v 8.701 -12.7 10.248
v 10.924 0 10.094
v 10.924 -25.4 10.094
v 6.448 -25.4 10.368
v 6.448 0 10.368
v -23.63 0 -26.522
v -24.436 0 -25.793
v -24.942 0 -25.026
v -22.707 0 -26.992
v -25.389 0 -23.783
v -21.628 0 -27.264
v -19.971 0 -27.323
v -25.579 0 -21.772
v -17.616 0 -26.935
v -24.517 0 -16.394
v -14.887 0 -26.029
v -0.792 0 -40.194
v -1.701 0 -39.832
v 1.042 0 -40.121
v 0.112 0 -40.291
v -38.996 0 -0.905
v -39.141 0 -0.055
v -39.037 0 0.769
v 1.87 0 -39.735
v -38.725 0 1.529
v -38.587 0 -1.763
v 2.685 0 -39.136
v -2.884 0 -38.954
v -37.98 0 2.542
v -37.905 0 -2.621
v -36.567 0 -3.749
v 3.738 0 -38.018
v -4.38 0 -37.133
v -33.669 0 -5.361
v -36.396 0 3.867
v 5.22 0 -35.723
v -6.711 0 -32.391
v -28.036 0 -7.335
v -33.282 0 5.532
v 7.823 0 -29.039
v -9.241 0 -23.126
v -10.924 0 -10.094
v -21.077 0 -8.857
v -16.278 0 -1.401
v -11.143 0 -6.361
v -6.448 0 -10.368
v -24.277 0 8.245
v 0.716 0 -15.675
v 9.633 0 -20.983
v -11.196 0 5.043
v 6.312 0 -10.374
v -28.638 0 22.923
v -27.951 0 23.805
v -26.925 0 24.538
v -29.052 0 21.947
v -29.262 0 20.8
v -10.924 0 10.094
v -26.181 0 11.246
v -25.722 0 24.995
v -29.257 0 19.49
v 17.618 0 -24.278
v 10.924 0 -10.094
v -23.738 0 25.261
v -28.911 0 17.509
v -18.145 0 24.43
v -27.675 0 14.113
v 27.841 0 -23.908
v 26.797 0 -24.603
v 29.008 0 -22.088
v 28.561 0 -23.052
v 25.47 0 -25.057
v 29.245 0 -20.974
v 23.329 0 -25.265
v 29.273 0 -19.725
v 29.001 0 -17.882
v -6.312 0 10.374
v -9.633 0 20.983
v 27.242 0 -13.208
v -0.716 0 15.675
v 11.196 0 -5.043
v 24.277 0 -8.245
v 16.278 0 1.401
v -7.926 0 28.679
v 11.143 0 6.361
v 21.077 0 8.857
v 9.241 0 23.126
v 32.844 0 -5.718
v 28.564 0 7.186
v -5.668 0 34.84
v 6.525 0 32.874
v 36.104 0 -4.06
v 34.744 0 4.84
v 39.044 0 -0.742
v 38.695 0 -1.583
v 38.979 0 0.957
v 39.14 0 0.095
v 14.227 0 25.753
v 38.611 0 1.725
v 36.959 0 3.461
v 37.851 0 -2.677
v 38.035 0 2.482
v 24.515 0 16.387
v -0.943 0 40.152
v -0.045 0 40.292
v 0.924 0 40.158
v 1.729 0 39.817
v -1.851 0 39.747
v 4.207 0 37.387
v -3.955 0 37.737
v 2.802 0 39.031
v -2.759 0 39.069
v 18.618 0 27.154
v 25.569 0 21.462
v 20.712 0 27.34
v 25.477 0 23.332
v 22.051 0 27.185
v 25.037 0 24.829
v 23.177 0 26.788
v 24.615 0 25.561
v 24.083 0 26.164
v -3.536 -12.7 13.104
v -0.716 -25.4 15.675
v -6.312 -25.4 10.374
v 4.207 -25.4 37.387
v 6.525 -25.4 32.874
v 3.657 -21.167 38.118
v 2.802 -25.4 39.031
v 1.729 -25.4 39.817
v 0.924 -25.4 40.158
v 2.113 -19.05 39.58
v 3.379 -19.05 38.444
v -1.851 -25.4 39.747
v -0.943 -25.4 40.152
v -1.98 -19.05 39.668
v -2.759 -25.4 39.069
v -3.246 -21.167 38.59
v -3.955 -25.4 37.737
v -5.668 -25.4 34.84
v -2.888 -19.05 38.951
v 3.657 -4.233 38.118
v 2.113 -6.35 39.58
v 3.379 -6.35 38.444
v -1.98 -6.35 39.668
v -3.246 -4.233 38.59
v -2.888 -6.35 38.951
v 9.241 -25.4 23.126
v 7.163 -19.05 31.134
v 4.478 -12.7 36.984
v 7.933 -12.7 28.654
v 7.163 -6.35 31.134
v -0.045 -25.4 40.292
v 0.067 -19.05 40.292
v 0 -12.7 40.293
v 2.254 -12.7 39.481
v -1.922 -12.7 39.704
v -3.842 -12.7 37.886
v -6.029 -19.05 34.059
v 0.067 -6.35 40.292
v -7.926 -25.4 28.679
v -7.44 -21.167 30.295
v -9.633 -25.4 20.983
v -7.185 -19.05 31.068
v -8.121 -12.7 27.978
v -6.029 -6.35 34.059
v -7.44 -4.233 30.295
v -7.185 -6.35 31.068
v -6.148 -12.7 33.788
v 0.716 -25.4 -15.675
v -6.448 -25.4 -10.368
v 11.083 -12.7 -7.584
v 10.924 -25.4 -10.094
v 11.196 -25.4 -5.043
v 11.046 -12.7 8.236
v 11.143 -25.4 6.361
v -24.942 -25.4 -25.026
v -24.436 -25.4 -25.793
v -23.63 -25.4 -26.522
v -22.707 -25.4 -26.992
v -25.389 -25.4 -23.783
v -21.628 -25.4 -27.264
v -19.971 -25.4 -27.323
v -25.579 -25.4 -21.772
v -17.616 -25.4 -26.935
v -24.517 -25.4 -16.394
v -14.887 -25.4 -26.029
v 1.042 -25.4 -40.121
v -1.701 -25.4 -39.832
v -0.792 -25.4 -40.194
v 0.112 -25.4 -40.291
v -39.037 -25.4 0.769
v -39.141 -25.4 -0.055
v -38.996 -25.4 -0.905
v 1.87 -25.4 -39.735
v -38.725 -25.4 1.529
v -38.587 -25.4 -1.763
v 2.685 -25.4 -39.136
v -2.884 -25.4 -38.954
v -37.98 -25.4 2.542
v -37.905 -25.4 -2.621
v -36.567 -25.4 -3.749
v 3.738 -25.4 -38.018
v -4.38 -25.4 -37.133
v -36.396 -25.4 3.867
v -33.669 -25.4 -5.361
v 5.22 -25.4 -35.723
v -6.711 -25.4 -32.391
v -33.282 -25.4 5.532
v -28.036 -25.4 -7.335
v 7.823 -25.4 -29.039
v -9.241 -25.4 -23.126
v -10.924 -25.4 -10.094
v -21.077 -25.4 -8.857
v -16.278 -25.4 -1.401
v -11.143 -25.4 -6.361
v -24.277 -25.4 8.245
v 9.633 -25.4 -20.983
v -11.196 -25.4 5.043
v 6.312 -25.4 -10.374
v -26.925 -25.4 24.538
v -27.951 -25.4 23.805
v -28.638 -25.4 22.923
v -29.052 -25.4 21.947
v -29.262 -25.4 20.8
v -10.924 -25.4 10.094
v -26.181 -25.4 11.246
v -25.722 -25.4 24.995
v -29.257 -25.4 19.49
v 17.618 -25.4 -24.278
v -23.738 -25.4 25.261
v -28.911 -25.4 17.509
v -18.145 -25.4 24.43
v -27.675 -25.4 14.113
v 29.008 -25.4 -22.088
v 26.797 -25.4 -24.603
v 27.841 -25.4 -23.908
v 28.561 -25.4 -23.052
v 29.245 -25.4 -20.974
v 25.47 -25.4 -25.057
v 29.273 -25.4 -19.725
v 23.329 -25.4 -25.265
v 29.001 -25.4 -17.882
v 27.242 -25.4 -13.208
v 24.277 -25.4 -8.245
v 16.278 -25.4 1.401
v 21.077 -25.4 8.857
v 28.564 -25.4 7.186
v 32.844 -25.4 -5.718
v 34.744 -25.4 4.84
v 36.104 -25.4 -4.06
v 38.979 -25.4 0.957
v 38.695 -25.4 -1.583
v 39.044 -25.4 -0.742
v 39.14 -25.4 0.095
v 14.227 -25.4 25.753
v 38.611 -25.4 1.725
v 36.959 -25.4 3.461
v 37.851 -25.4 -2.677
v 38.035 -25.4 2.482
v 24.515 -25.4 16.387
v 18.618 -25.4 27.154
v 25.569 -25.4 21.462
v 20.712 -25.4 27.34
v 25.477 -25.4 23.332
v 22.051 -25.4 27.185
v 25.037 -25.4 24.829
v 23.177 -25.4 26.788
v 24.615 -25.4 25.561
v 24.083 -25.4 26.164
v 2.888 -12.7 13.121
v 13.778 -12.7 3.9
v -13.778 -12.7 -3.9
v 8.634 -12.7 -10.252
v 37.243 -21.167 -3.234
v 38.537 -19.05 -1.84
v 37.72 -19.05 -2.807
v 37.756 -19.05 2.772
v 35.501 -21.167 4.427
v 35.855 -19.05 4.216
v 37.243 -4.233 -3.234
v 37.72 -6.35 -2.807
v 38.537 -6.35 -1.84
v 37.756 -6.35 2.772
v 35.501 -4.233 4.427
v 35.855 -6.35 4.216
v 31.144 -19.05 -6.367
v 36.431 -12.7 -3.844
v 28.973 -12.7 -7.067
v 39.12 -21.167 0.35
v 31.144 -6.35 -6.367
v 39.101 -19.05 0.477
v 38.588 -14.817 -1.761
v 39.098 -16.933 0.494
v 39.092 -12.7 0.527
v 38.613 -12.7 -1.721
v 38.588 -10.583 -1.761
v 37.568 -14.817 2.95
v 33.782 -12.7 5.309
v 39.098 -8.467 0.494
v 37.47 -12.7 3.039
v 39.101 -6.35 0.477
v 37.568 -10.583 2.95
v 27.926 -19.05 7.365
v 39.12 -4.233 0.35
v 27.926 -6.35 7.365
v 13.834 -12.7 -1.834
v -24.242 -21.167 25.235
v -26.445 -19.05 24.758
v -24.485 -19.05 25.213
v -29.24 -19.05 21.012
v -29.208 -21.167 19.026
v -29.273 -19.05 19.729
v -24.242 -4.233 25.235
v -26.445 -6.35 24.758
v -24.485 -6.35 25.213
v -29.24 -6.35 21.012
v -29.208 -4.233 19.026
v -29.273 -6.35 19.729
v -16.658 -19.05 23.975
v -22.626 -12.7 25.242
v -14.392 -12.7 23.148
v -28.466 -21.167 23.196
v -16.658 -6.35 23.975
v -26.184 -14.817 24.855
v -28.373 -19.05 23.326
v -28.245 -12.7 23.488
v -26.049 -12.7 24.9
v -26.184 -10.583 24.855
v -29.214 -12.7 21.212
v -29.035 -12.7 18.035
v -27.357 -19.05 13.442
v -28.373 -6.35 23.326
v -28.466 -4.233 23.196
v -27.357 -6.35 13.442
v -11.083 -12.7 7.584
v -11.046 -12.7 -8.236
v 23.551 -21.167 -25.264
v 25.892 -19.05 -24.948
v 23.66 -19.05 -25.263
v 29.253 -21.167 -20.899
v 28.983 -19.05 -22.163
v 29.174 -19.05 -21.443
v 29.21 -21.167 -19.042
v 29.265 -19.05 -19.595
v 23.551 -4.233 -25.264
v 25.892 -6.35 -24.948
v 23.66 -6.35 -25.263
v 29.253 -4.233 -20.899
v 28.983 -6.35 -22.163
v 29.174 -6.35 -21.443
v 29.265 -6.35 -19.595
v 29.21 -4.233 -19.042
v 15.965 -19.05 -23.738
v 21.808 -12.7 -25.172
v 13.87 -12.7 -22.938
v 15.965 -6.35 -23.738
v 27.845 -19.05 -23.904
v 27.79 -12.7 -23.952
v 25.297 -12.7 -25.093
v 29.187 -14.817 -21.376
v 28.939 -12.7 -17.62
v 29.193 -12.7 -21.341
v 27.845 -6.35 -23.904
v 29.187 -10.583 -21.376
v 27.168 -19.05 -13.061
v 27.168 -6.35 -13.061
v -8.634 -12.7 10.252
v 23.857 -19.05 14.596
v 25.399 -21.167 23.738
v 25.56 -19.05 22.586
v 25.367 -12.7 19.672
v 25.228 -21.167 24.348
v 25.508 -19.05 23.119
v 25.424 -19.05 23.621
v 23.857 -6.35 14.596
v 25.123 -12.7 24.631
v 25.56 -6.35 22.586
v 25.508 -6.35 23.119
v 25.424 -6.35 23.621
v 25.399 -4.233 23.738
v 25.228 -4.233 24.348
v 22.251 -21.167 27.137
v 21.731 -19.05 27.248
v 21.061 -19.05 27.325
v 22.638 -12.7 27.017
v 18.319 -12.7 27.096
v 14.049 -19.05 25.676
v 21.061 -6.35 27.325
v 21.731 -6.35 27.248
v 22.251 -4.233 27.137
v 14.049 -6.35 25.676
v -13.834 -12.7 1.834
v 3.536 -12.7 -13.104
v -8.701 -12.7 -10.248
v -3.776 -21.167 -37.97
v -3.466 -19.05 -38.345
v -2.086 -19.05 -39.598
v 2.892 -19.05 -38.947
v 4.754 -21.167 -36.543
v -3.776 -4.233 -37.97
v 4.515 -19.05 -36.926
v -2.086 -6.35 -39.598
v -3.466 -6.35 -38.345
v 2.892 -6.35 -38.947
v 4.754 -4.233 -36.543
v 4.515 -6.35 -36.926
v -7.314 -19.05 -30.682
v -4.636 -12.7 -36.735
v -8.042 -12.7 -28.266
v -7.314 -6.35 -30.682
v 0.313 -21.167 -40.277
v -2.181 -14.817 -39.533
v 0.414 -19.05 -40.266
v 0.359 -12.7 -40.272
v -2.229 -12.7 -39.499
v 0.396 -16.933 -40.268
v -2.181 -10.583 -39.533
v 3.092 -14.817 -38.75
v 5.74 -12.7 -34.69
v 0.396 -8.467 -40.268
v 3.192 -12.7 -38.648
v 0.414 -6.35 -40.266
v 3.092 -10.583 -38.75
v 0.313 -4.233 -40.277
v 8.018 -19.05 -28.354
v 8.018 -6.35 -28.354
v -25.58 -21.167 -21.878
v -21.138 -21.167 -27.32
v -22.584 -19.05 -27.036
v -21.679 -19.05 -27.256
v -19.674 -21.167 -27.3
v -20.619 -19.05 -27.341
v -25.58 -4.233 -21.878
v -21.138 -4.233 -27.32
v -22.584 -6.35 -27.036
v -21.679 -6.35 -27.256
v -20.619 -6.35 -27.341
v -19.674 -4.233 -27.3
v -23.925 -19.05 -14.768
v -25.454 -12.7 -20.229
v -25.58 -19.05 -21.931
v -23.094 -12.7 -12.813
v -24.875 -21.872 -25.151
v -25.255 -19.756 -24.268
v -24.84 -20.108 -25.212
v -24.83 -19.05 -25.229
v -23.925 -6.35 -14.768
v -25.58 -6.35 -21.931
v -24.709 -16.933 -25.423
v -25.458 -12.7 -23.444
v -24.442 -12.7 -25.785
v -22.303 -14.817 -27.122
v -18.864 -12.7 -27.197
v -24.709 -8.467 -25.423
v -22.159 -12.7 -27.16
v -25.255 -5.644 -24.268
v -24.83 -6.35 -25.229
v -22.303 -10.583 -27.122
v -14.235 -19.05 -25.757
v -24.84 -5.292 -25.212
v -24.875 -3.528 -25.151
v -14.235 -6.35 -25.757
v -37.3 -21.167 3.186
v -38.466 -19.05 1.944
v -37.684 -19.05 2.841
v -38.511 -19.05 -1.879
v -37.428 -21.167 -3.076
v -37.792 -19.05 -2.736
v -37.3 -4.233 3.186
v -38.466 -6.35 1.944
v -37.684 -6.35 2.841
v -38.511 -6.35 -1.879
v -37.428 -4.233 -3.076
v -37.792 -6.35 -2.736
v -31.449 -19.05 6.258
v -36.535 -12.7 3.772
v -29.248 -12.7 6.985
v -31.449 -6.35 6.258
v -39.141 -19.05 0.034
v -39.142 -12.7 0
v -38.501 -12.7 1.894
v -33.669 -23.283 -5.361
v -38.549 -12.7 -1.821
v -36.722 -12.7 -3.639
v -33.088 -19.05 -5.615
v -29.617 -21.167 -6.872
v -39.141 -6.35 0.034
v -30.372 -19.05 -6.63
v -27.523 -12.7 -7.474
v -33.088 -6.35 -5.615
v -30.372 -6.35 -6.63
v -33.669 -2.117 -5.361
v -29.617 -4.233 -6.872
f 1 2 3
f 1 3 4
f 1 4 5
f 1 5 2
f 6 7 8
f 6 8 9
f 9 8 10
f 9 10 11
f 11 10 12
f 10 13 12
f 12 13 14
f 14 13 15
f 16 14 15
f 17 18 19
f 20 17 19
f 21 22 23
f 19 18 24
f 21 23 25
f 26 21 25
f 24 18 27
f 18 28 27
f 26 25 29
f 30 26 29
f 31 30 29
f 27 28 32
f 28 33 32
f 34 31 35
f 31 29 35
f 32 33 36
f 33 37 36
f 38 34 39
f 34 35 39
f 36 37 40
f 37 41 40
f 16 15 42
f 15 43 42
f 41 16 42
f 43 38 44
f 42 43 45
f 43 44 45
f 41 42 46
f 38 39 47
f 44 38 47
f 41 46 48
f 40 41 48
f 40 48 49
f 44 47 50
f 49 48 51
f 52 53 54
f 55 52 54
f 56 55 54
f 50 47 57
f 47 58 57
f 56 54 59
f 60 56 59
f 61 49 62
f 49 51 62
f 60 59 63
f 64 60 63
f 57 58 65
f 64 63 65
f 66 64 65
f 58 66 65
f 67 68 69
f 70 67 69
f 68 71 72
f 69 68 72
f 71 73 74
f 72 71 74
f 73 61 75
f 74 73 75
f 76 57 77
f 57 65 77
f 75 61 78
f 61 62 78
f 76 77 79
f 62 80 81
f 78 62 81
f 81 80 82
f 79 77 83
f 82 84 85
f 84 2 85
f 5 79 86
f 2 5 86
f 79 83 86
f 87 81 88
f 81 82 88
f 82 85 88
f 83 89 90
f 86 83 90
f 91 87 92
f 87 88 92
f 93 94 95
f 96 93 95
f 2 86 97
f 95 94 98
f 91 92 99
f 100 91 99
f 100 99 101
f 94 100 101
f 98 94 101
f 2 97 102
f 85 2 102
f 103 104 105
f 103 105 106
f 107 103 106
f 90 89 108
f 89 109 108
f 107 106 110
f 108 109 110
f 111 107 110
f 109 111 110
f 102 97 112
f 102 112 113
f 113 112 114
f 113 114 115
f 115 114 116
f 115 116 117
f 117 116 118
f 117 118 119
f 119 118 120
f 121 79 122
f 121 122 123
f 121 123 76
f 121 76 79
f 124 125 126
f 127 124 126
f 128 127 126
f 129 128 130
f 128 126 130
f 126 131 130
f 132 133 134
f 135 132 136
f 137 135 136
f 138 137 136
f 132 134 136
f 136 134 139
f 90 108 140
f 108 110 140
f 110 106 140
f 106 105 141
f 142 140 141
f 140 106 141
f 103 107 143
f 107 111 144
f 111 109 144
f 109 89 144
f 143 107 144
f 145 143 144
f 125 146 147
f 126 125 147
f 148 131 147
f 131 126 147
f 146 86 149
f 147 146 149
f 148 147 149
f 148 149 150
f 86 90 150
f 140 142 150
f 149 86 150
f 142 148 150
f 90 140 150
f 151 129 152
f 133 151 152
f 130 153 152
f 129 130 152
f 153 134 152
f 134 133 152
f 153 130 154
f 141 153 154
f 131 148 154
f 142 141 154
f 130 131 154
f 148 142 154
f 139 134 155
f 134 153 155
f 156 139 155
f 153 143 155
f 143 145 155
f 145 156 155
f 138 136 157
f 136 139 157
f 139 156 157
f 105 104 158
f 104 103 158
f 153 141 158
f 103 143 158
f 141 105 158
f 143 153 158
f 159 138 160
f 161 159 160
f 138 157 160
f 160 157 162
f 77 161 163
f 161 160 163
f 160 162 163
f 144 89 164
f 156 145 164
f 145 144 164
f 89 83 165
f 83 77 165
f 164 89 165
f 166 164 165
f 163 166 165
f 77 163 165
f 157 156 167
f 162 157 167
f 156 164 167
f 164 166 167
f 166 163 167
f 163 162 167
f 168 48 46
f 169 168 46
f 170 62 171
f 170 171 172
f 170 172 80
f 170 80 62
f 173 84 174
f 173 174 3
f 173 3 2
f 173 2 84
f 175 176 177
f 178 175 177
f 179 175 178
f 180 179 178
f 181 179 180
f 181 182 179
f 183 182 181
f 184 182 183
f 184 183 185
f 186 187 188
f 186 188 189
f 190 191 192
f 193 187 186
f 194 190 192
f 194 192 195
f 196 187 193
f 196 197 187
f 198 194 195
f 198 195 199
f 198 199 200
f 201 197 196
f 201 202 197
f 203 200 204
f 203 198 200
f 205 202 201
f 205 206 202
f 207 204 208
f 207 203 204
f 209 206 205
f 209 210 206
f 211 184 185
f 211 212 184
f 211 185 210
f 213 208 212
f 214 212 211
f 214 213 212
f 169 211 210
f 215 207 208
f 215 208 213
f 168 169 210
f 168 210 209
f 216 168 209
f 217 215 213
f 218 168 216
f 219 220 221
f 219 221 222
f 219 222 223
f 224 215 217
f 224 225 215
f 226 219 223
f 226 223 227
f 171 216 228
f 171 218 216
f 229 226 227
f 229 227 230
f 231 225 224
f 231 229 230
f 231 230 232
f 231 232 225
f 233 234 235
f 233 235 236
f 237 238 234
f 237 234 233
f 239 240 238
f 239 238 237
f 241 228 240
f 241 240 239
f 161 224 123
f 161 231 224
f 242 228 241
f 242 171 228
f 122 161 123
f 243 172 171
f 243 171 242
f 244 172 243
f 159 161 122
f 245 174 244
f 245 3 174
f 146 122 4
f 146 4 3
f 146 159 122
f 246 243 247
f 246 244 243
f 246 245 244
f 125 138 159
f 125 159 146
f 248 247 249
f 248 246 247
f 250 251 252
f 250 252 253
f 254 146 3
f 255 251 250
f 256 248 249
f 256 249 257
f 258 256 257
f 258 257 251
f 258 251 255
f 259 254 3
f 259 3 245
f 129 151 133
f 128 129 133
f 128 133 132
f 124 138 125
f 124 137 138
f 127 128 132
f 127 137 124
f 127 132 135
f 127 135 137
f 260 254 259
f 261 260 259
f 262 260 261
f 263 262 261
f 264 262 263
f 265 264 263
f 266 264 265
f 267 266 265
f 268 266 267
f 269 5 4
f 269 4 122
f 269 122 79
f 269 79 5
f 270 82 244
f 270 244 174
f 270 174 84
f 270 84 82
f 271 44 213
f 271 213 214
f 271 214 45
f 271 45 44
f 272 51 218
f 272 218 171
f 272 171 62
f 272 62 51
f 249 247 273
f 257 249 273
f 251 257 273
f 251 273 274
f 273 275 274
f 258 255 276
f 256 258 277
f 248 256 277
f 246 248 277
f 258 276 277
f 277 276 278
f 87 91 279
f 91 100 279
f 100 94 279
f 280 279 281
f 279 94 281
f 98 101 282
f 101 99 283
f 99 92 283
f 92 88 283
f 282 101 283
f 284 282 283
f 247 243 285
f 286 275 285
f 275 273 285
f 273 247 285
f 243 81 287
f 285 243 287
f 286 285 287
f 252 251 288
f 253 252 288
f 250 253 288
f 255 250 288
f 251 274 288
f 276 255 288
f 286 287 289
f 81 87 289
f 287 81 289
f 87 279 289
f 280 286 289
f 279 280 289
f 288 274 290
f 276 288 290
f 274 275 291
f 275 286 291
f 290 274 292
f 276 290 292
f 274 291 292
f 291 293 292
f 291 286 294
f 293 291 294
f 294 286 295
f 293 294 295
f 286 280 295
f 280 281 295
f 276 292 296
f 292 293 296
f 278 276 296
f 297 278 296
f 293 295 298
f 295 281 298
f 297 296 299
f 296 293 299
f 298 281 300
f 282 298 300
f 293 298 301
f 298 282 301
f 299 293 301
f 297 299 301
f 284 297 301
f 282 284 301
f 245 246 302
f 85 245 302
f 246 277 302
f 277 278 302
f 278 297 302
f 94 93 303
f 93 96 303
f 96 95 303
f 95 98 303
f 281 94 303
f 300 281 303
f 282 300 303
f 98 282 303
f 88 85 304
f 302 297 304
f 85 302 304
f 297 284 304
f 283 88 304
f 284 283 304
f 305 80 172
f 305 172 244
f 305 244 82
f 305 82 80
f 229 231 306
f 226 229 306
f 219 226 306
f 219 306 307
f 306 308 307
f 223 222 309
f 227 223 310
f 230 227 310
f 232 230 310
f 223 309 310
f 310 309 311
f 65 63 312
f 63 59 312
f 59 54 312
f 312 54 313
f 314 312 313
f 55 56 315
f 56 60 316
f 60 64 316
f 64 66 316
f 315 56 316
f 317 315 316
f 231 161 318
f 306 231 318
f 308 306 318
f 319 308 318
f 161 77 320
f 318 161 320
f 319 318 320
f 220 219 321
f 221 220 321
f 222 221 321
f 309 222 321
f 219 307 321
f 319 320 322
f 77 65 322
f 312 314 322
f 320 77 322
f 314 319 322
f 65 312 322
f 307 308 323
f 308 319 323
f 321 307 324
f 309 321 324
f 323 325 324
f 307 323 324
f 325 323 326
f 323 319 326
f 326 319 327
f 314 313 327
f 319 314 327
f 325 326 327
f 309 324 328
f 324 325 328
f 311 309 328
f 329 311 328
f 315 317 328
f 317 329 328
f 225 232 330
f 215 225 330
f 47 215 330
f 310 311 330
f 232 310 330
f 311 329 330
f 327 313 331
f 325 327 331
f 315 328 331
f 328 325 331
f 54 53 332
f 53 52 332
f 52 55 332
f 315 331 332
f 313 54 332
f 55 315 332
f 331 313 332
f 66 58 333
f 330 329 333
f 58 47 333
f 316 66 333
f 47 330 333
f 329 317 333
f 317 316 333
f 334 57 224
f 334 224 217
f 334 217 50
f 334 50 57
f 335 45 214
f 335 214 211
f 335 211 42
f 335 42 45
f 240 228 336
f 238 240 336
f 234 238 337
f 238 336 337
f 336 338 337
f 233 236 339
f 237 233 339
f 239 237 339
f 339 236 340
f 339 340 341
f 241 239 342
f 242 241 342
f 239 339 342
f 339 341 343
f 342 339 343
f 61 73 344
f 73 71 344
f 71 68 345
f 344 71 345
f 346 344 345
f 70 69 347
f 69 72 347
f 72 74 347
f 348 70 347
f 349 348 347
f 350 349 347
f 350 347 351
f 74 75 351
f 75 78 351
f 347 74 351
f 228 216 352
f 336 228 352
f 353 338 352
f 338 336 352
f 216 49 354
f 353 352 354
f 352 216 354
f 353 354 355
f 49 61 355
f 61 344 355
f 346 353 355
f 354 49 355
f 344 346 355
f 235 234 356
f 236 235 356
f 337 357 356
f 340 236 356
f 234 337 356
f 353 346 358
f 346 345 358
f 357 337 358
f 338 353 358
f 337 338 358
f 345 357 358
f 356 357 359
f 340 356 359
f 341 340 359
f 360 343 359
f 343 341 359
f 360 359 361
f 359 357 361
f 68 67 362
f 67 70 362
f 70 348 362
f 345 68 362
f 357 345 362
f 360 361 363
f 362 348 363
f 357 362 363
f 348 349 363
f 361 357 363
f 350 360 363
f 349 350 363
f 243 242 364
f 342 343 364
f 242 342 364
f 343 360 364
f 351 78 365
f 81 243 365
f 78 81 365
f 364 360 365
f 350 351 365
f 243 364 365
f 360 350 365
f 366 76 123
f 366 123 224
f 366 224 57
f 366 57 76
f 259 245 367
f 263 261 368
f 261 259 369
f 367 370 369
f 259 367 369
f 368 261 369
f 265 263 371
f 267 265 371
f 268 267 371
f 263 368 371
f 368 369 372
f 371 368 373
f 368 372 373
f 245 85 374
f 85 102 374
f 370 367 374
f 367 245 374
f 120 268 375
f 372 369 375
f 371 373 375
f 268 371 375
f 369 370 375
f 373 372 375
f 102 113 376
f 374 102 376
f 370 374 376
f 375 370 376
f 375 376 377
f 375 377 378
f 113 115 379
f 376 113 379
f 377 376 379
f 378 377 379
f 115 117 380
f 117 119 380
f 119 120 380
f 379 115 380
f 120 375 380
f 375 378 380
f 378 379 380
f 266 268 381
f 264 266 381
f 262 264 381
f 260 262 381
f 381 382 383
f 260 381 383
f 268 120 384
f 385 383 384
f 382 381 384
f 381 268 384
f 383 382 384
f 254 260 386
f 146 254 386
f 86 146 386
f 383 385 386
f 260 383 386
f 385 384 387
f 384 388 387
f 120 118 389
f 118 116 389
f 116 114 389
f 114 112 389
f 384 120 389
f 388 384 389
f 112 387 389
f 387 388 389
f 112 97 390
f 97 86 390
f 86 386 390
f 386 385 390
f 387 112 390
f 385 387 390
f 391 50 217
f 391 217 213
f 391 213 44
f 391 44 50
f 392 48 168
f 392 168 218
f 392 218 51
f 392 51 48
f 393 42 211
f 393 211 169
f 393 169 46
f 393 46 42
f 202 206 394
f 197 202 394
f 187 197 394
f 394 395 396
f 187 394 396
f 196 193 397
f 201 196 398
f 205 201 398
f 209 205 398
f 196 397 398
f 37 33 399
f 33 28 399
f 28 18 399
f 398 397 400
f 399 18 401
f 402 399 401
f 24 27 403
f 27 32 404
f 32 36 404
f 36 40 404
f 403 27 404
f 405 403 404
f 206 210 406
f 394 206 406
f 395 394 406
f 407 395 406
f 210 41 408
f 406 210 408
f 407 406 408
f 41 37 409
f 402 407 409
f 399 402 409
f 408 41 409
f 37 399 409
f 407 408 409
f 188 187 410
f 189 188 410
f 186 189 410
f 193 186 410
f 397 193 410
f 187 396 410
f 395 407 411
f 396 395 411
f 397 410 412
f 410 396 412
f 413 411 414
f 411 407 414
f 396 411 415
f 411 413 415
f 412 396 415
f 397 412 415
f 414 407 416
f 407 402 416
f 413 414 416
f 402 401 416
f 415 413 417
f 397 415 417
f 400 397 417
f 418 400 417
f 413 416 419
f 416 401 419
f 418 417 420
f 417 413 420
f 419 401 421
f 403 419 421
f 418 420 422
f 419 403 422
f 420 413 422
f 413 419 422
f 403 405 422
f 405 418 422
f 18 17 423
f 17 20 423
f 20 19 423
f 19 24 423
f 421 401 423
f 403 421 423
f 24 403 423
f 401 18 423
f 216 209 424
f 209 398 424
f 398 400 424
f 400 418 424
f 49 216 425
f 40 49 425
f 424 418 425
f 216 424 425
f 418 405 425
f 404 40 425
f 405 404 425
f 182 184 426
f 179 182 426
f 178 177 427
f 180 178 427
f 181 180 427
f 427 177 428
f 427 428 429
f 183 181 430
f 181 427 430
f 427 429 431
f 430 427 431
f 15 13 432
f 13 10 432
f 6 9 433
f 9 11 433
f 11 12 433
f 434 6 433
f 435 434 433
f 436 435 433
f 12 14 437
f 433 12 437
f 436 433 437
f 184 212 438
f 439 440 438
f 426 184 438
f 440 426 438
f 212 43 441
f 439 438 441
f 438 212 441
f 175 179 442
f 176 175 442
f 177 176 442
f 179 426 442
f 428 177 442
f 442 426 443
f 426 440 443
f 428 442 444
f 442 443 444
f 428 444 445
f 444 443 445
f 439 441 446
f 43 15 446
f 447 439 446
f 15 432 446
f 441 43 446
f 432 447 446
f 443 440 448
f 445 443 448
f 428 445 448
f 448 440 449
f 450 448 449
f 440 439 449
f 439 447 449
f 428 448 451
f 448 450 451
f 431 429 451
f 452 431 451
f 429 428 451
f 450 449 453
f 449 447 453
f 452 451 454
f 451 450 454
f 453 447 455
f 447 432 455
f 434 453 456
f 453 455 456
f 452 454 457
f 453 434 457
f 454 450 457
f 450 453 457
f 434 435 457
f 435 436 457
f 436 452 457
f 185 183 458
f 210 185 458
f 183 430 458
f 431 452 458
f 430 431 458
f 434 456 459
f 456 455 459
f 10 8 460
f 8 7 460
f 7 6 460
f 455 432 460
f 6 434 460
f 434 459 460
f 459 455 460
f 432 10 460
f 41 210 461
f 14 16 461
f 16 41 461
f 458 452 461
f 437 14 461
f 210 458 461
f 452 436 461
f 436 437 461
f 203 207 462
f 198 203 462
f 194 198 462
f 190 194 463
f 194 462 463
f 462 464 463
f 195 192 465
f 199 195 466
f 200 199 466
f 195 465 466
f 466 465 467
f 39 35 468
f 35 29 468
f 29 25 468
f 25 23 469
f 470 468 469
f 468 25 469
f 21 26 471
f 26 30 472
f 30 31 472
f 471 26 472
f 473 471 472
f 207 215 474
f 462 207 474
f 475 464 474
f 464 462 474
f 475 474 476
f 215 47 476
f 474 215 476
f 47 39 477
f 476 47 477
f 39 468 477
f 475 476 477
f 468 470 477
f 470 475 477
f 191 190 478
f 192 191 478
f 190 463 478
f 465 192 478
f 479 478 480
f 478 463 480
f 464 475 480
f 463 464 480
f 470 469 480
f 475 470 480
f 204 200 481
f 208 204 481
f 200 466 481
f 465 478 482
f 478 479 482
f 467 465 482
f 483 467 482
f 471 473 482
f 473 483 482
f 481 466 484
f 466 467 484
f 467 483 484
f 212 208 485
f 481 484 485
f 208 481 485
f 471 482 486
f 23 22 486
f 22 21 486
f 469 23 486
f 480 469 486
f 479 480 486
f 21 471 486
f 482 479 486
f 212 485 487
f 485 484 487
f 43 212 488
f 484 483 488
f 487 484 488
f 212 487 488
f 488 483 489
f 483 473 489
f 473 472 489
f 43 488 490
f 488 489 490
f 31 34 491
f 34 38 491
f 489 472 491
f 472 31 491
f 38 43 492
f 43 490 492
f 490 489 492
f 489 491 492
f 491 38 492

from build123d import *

# Parameters (mm, degrees)
F1_DEPTH = 25.4


with BuildPart() as f1:
    # F0 (on Front) → F1 (new body)
    with BuildSketch(Plane.XZ):
        with BuildLine():
            add(Edge.make_bspline(
                [(-9.6334397965, 20.9826078179), (-24.1749871063, 28.3822451496), (-28.2449897272, 23.4879380359)],
                knots=[5.3150586543, 5.3150586543, 5.3150586543, 6.2831853072, 6.2831853072, 6.2831853072], degree=2, weights=[1, 0.885111246, 1]))
            add(Edge.make_bspline(
                [(-28.2449897272, 23.4879380359), (-31.7999684313, 19.2129635012), (-24.2773097088, 8.2450815815)],
                knots=[0, 0, 0, 0.8610435374, 0.8610435374, 0.8610435374], degree=2, weights=[1, 0.9087481158, 1]))
            add(Edge.make_bspline(
                [(-10.9244512844, 10.093500542), (-18.2738244712, 9.5198655215), (-24.2773097088, 8.2450815815)],
                knots=[4.9952466524, 4.9952466524, 4.9952466524, 5.3814419574, 5.3814419574, 5.3814419574], degree=2, weights=[1, 0.9814145055, 1]))
            add(Edge.make_bspline(
                [(-9.6334397965, 20.9826078179), (-10.5051315613, 15.8799657732), (-10.9244512844, 10.093500542)],
                knots=[1.0230633531, 1.0230633531, 1.0230633531, 1.3175957323, 1.3175957323, 1.3175957323], degree=2, weights=[1, 0.989175918, 1]))
        make_face()
        with BuildLine():
            add(Edge.make_bspline(
                [(-10.9244512844, 10.093500542), (-18.2738244712, 9.5198655215), (-24.2773097088, 8.2450815815)],
                knots=[4.9952466524, 4.9952466524, 4.9952466524, 5.3814419574, 5.3814419574, 5.3814419574], degree=2, weights=[1, 0.9814145055, 1]))
            add(Edge.make_bspline(
                [(-24.2773097088, 8.2450815815), (-21.0599122764, 3.554182203), (-16.2778676613, -1.4007753111)],
                knots=[0.8610435374, 0.8610435374, 0.8610435374, 1.2489447615, 1.2489447615, 1.2489447615], degree=2, weights=[1, 0.9812504656, 1]))
            add(Edge.make_bspline(
                [(-11.1955196289, 5.0427610987), (-13.9309966677, 1.8467505057), (-16.2778676613, -1.4007753111)],
                knots=[1.679891763, 1.679891763, 1.679891763, 1.9166436443, 1.9166436443, 1.9166436443], degree=2, weights=[1, 0.9930017462, 1]))
            add(Edge.make_bspline(
                [(-10.9244512844, 10.093500542), (-11.1052111409, 7.5990778678), (-11.1955196289, 5.0427610987)],
                knots=[1.3175957323, 1.3175957323, 1.3175957323, 1.4453143988, 1.4453143988, 1.4453143988], degree=2, weights=[1, 0.9979616856, 1]))
        make_face()
        with BuildLine():
            add(Edge.make_bspline(
                [(-24.2773097088, 8.2450815815), (-21.0599122764, 3.554182203), (-16.2778676613, -1.4007753111)],
                knots=[0.8610435374, 0.8610435374, 0.8610435374, 1.2489447615, 1.2489447615, 1.2489447615], degree=2, weights=[1, 0.9812504656, 1]))
            add(Edge.make_bspline(
                [(-24.2773097088, 8.2450815815), (-39.1415841877, 5.0887919203), (-39.1415841877, 0)],
                knots=[5.3814419574, 5.3814419574, 5.3814419574, 6.2831853072, 6.2831853072, 6.2831853072], degree=2, weights=[1, 0.9000676118, 1]))
            add(Edge.make_bspline(
                [(-39.1415841877, 0), (-39.1415841877, -5.7569625435), (-21.0774784797, -8.857047955)],
                knots=[0, 0, 0, 1.0021484051, 1.0021484051, 1.0021484051], degree=2, weights=[1, 0.8770670555, 1]))
            add(Edge.make_bspline(
                [(-16.2778676613, -1.4007753111), (-19.0449410134, -5.2297638547), (-21.0774784797, -8.857047955)],
                knots=[1.9166436443, 1.9166436443, 1.9166436443, 2.1952798257, 2.1952798257, 2.1952798257], degree=2, weights=[1, 0.9903109217, 1]))
        make_face()
        with BuildLine():
            add(Edge.make_bspline(
                [(0, 40.2928069234), (-6.3346503874, 40.2928069234), (-9.6334397965, 20.9826078179)],
                knots=[0, 0, 0, 1.0230633531, 1.0230633531, 1.0230633531], degree=2, weights=[1, 0.8719957546, 1]))
            add(Edge.make_bspline(
                [(-0.7156895988, 15.6745771205), (-5.3015148464, 18.7782568712), (-9.6334397965, 20.9826078179)],
                knots=[5.0043199829, 5.0043199829, 5.0043199829, 5.3150586543, 5.3150586543, 5.3150586543], degree=2, weights=[1, 0.9879544453, 1]))
            add(Edge.make_bspline(
                [(9.2405859063, 23.1259098387), (4.4354249084, 20.1875354382), (-0.7156895988, 15.6745771205)],
                knots=[0.8573022563, 0.8573022563, 0.8573022563, 1.2548784247, 1.2548784247, 1.2548784247], degree=2, weights=[1, 0.9803066286, 1]))
            add(Edge.make_bspline(
                [(9.2405859063, 23.1259098387), (5.8709662193, 40.2928069234), (0, 40.2928069234)],
                knots=[5.3237058825, 5.3237058825, 5.3237058825, 6.2831853072, 6.2831853072, 6.2831853072], degree=2, weights=[1, 0.8871150882, 1]))
        make_face()
        with BuildLine():
            add(Edge.make_bspline(
                [(-0.7156895988, 15.6745771205), (-5.3015148464, 18.7782568712), (-9.6334397965, 20.9826078179)],
                knots=[5.0043199829, 5.0043199829, 5.0043199829, 5.3150586543, 5.3150586543, 5.3150586543], degree=2, weights=[1, 0.9879544453, 1]))
            add(Edge.make_bspline(
                [(-9.6334397965, 20.9826078179), (-10.5051315613, 15.8799657732), (-10.9244512844, 10.093500542)],
                knots=[1.0230633531, 1.0230633531, 1.0230633531, 1.3175957323, 1.3175957323, 1.3175957323], degree=2, weights=[1, 0.989175918, 1]))
            add(Edge.make_bspline(
                [(-6.3122484149, 10.3736136544), (-8.649911175, 10.2710334865), (-10.9244512844, 10.093500542)],
                knots=[4.8743633692, 4.8743633692, 4.8743633692, 4.9952466524, 4.9952466524, 4.9952466524], degree=2, weights=[1, 0.99817396, 1]))
            add(Edge.make_bspline(
                [(-0.7156895988, 15.6745771205), (-3.5573674178, 13.184946278), (-6.3122484149, 10.3736136544)],
                knots=[1.2548784247, 1.2548784247, 1.2548784247, 1.476233539, 1.476233539, 1.476233539], degree=2, weights=[1, 0.9938814887, 1]))
        make_face()
        with BuildLine():
            add(Edge.make_bspline(
                [(-16.2778676613, -1.4007753111), (-13.8469877195, -3.9195529059), (-11.1427402225, -6.3609505957)],
                knots=[1.2489447615, 1.2489447615, 1.2489447615, 1.4479790573, 1.4479790573, 1.4479790573], degree=2, weights=[1, 0.9950522541, 1]))
            add(Edge.make_bspline(
                [(-16.2778676613, -1.4007753111), (-19.0449410134, -5.2297638547), (-21.0774784797, -8.857047955)],
                knots=[1.9166436443, 1.9166436443, 1.9166436443, 2.1952798257, 2.1952798257, 2.1952798257], degree=2, weights=[1, 0.9903109217, 1]))
            add(Edge.make_bspline(
                [(-21.0774784797, -8.857047955), (-16.3321884544, -9.6714145568), (-10.9244512844, -10.093500542)],
                knots=[1.0021484051, 1.0021484051, 1.0021484051, 1.2879386547, 1.2879386547, 1.2879386547], degree=2, weights=[1, 0.9898078522, 1]))
            add(Edge.make_bspline(
                [(-11.1427402225, -6.3609505957), (-11.0583542324, -8.2456867845), (-10.9244512844, -10.093500542)],
                knots=[1.7293276756, 1.7293276756, 1.7293276756, 1.8239969212, 1.8239969212, 1.8239969212], degree=2, weights=[1, 0.9988799259, 1]))
        make_face()
        with BuildLine():
            add(Edge.make_bspline(
                [(9.2405859063, 23.1259098387), (4.4354249084, 20.1875354382), (-0.7156895988, 15.6745771205)],
                knots=[0.8573022563, 0.8573022563, 0.8573022563, 1.2548784247, 1.2548784247, 1.2548784247], degree=2, weights=[1, 0.9803066286, 1]))
            add(Edge.make_bspline(
                [(6.4476243744, 10.3676077129), (2.9099172017, 13.2207717958), (-0.7156895988, 15.6745771205)],
                knots=[4.7579047623, 4.7579047623, 4.7579047623, 5.0043199829, 5.0043199829, 5.0043199829], degree=2, weights=[1, 0.992419539, 1]))
            add(Edge.make_bspline(
                [(10.9244512844, 10.093500542), (8.716024728, 10.2658731758), (6.4476243744, 10.3676077129)],
                knots=[4.4295313083, 4.4295313083, 4.4295313083, 4.546909087, 4.546909087, 4.546909087], degree=2, weights=[1, 0.9982783014, 1]))
            add(Edge.make_bspline(
                [(10.9244512844, 10.093500542), (10.4128198041, 17.1538356722), (9.2405859063, 23.1259098387)],
                knots=[4.9655895748, 4.9655895748, 4.9655895748, 5.3237058825, 5.3237058825, 5.3237058825], degree=2, weights=[1, 0.9840118747, 1]))
        make_face()
        with BuildLine():
            add(Edge.make_bspline(
                [(-21.0774784797, -8.857047955), (-16.3321884544, -9.6714145568), (-10.9244512844, -10.093500542)],
                knots=[1.0021484051, 1.0021484051, 1.0021484051, 1.2879386547, 1.2879386547, 1.2879386547], degree=2, weights=[1, 0.9898078522, 1]))
            add(Edge.make_bspline(
                [(-21.0774784797, -8.857047955), (-39.4110199858, -41.5752461227), (-9.2405859063, -23.1259098387)],
                knots=[2.1952798257, 2.1952798257, 2.1952798257, 3.9988949099, 3.9988949099, 3.9988949099], degree=2, weights=[1, 0.6201930572, 1]))
            add(Edge.make_bspline(
                [(-10.9244512844, -10.093500542), (-10.4128198041, -17.1538356722), (-9.2405859063, -23.1259098387)],
                knots=[1.8239969212, 1.8239969212, 1.8239969212, 2.1821132289, 2.1821132289, 2.1821132289], degree=2, weights=[1, 0.9840118747, 1]))
        make_face()
        with BuildLine():
            add(Edge.make_bspline(
                [(24.0825692568, 26.1637814162), (20.1411706974, 29.791659293), (9.2405859063, 23.1259098387)],
                knots=[0, 0, 0, 0.8573022563, 0.8573022563, 0.8573022563], degree=2, weights=[1, 0.9095272279, 1]))
            add(Edge.make_bspline(
                [(10.9244512844, 10.093500542), (10.4128198041, 17.1538356722), (9.2405859063, 23.1259098387)],
                knots=[4.9655895748, 4.9655895748, 4.9655895748, 5.3237058825, 5.3237058825, 5.3237058825], degree=2, weights=[1, 0.9840118747, 1]))
            add(Edge.make_bspline(
                [(21.0774784797, 8.857047955), (16.3321884544, 9.6714145568), (10.9244512844, 10.093500542)],
                knots=[4.1437410587, 4.1437410587, 4.1437410587, 4.4295313083, 4.4295313083, 4.4295313083], degree=2, weights=[1, 0.9898078522, 1]))
            add(Edge.make_bspline(
                [(21.0774784797, 8.857047955), (28.4979272045, 22.0996455071), (24.0825692568, 26.1637814162)],
                knots=[5.3368724793, 5.3368724793, 5.3368724793, 6.2831853072, 6.2831853072, 6.2831853072], degree=2, weights=[1, 0.8901343527, 1]))
        make_face()
        with BuildLine():
            add(Edge.make_bspline(
                [(-6.4476243744, -10.3676077129), (-2.9099172017, -13.2207717958), (0.7156895988, -15.6745771205)],
                knots=[1.6163121087, 1.6163121087, 1.6163121087, 1.8627273293, 1.8627273293, 1.8627273293], degree=2, weights=[1, 0.992419539, 1]))
            add(Edge.make_bspline(
                [(-10.9244512844, -10.093500542), (-8.716024728, -10.2658731758), (-6.4476243744, -10.3676077129)],
                knots=[1.2879386547, 1.2879386547, 1.2879386547, 1.4053164334, 1.4053164334, 1.4053164334], degree=2, weights=[1, 0.9982783014, 1]))
            add(Edge.make_bspline(
                [(-10.9244512844, -10.093500542), (-10.4128198041, -17.1538356722), (-9.2405859063, -23.1259098387)],
                knots=[1.8239969212, 1.8239969212, 1.8239969212, 2.1821132289, 2.1821132289, 2.1821132289], degree=2, weights=[1, 0.9840118747, 1]))
            add(Edge.make_bspline(
                [(-9.2405859063, -23.1259098387), (-4.4354249084, -20.1875354382), (0.7156895988, -15.6745771205)],
                knots=[3.9988949099, 3.9988949099, 3.9988949099, 4.3964710783, 4.3964710783, 4.3964710783], degree=2, weights=[1, 0.9803066286, 1]))
        make_face()
        with BuildLine():
            add(Edge.make_bspline(
                [(-9.2405859063, -23.1259098387), (-4.4354249084, -20.1875354382), (0.7156895988, -15.6745771205)],
                knots=[3.9988949099, 3.9988949099, 3.9988949099, 4.3964710783, 4.3964710783, 4.3964710783], degree=2, weights=[1, 0.9803066286, 1]))
            add(Edge.make_bspline(
                [(-9.2405859063, -23.1259098387), (0.6549861938, -73.5399872764), (9.6334397965, -20.9826078179)],
                knots=[2.1821132289, 2.1821132289, 2.1821132289, 4.1646560067, 4.1646560067, 4.1646560067], degree=2, weights=[1, 0.5476265033, 1]))
            add(Edge.make_bspline(
                [(0.7156895988, -15.6745771205), (5.3015148464, -18.7782568712), (9.6334397965, -20.9826078179)],
                knots=[1.8627273293, 1.8627273293, 1.8627273293, 2.1734660007, 2.1734660007, 2.1734660007], degree=2, weights=[1, 0.9879544453, 1]))
        make_face()
        with BuildLine():
            add(Edge.make_bspline(
                [(11.1427402225, 6.3609505957), (11.0583542324, 8.2456867845), (10.9244512844, 10.093500542)],
                knots=[4.8709203292, 4.8709203292, 4.8709203292, 4.9655895748, 4.9655895748, 4.9655895748], degree=2, weights=[1, 0.9988799259, 1]))
            add(Edge.make_bspline(
                [(16.2778676613, 1.4007753111), (13.8469877195, 3.9195529059), (11.1427402225, 6.3609505957)],
                knots=[4.3905374151, 4.3905374151, 4.3905374151, 4.5895717109, 4.5895717109, 4.5895717109], degree=2, weights=[1, 0.9950522541, 1]))
            add(Edge.make_bspline(
                [(16.2778676613, 1.4007753111), (19.0449410134, 5.2297638547), (21.0774784797, 8.857047955)],
                knots=[5.0582362979, 5.0582362979, 5.0582362979, 5.3368724793, 5.3368724793, 5.3368724793], degree=2, weights=[1, 0.9903109217, 1]))
            add(Edge.make_bspline(
                [(21.0774784797, 8.857047955), (16.3321884544, 9.6714145568), (10.9244512844, 10.093500542)],
                knots=[4.1437410587, 4.1437410587, 4.1437410587, 4.4295313083, 4.4295313083, 4.4295313083], degree=2, weights=[1, 0.9898078522, 1]))
        make_face()
        with BuildLine():
            add(Edge.make_bspline(
                [(0.7156895988, -15.6745771205), (3.5573674178, -13.184946278), (6.3122484149, -10.3736136544)],
                knots=[4.3964710783, 4.3964710783, 4.3964710783, 4.6178261925, 4.6178261925, 4.6178261925], degree=2, weights=[1, 0.9938814887, 1]))
            add(Edge.make_bspline(
                [(0.7156895988, -15.6745771205), (5.3015148464, -18.7782568712), (9.6334397965, -20.9826078179)],
                knots=[1.8627273293, 1.8627273293, 1.8627273293, 2.1734660007, 2.1734660007, 2.1734660007], degree=2, weights=[1, 0.9879544453, 1]))
            add(Edge.make_bspline(
                [(9.6334397965, -20.9826078179), (10.5051315613, -15.8799657732), (10.9244512844, -10.093500542)],
                knots=[4.1646560067, 4.1646560067, 4.1646560067, 4.4591883859, 4.4591883859, 4.4591883859], degree=2, weights=[1, 0.989175918, 1]))
            add(Edge.make_bspline(
                [(6.3122484149, -10.3736136544), (8.649911175, -10.2710334865), (10.9244512844, -10.093500542)],
                knots=[1.7327707156, 1.7327707156, 1.7327707156, 1.8536539989, 1.8536539989, 1.8536539989], degree=2, weights=[1, 0.99817396, 1]))
        make_face()
        with BuildLine():
            add(Edge.make_bspline(
                [(9.6334397965, -20.9826078179), (10.5051315613, -15.8799657732), (10.9244512844, -10.093500542)],
                knots=[4.1646560067, 4.1646560067, 4.1646560067, 4.4591883859, 4.4591883859, 4.4591883859], degree=2, weights=[1, 0.989175918, 1]))
            add(Edge.make_bspline(
                [(9.6334397965, -20.9826078179), (45.5488880813, -39.2586059804), (24.2773097088, -8.2450815815)],
                knots=[2.1734660007, 2.1734660007, 2.1734660007, 4.002636191, 4.002636191, 4.002636191], degree=2, weights=[1, 0.610119361, 1]))
            add(Edge.make_bspline(
                [(10.9244512844, -10.093500542), (18.2738244712, -9.5198655215), (24.2773097088, -8.2450815815)],
                knots=[1.8536539989, 1.8536539989, 1.8536539989, 2.2398493038, 2.2398493038, 2.2398493038], degree=2, weights=[1, 0.9814145055, 1]))
        make_face()
        with BuildLine():
            add(Edge.make_bspline(
                [(16.2778676613, 1.4007753111), (19.0449410134, 5.2297638547), (21.0774784797, 8.857047955)],
                knots=[5.0582362979, 5.0582362979, 5.0582362979, 5.3368724793, 5.3368724793, 5.3368724793], degree=2, weights=[1, 0.9903109217, 1]))
            add(Edge.make_bspline(
                [(24.2773097088, -8.2450815815), (21.0599122764, -3.554182203), (16.2778676613, 1.4007753111)],
                knots=[4.002636191, 4.002636191, 4.002636191, 4.3905374151, 4.3905374151, 4.3905374151], degree=2, weights=[1, 0.9812504656, 1]))
            add(Edge.make_bspline(
                [(24.2773097088, -8.2450815815), (67.3889424296, 0.9092704069), (21.0774784797, 8.857047955)],
                knots=[2.2398493038, 2.2398493038, 2.2398493038, 4.1437410587, 4.1437410587, 4.1437410587], degree=2, weights=[1, 0.5800991823, 1]))
        make_face()
        with BuildLine():
            add(Edge.make_bspline(
                [(24.2773097088, -8.2450815815), (21.0599122764, -3.554182203), (16.2778676613, 1.4007753111)],
                knots=[4.002636191, 4.002636191, 4.002636191, 4.3905374151, 4.3905374151, 4.3905374151], degree=2, weights=[1, 0.9812504656, 1]))
            add(Edge.make_bspline(
                [(11.1955196289, -5.0427610987), (13.9309966677, -1.8467505057), (16.2778676613, 1.4007753111)],
                knots=[4.8214844166, 4.8214844166, 4.8214844166, 5.0582362979, 5.0582362979, 5.0582362979], degree=2, weights=[1, 0.9930017462, 1]))
            add(Edge.make_bspline(
                [(10.9244512844, -10.093500542), (11.1052111409, -7.5990778678), (11.1955196289, -5.0427610987)],
                knots=[4.4591883859, 4.4591883859, 4.4591883859, 4.5869070524, 4.5869070524, 4.5869070524], degree=2, weights=[1, 0.9979616856, 1]))
            add(Edge.make_bspline(
                [(10.9244512844, -10.093500542), (18.2738244712, -9.5198655215), (24.2773097088, -8.2450815815)],
                knots=[1.8536539989, 1.8536539989, 1.8536539989, 2.2398493038, 2.2398493038, 2.2398493038], degree=2, weights=[1, 0.9814145055, 1]))
        make_face()
    extrude(amount=F1_DEPTH)


solid = f1.part
